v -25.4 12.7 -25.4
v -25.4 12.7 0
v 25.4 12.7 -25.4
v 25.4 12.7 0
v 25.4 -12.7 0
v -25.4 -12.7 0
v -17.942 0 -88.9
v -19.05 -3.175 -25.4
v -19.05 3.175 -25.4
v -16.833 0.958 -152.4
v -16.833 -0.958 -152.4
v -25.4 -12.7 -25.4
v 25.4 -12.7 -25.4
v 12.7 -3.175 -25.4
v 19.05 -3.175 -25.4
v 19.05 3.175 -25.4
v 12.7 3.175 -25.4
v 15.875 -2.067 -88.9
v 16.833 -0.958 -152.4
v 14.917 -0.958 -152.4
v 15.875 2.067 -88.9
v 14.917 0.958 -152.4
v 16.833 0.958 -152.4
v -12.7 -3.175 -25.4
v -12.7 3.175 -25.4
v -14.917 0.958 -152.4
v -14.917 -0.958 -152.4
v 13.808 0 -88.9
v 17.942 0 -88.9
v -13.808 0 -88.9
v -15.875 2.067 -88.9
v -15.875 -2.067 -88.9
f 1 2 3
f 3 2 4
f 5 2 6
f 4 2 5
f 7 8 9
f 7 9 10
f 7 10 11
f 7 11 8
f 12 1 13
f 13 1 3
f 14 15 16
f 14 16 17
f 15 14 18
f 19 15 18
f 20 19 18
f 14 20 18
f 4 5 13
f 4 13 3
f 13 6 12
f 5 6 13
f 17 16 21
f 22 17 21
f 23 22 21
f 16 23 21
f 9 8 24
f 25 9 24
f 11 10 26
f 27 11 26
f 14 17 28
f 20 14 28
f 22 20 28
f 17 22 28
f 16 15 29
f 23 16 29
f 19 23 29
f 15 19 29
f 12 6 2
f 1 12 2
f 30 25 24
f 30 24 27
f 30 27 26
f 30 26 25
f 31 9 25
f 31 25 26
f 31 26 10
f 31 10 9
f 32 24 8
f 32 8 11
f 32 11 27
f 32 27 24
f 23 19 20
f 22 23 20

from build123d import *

# Parameters (mm, degrees)
F0_W     = 50.8
F0_H     = 25.4
F1_DEPTH = 25.4
F2_W     = 6.35
F2_H     = 6.35
F3_DEPTH = 127
F3_TAPER = 1


with BuildPart() as f1:
    # F0 (on Top) → F1 (new body)
    with BuildSketch(Plane.XY):
        Rectangle(F0_W, F0_H)
    extrude(amount=-F1_DEPTH)


with BuildPart() as f3:
    # F2 (on face) → F3 (new body)
    with BuildSketch(Plane(origin=(0, 0, -25.4), x_dir=(1, 0, 0), z_dir=(0, 0, -1))):
        with Locations((-15.875, 0)):
            Rectangle(F2_W, F2_H)
    extrude(amount=F3_DEPTH, taper=F3_TAPER)


with BuildPart() as f4_1:
    # F4: instance of F3
    add(f3.part.mirror(Plane.YZ))


solid = Compound([f1.part, f3.part, f4_1.part])
